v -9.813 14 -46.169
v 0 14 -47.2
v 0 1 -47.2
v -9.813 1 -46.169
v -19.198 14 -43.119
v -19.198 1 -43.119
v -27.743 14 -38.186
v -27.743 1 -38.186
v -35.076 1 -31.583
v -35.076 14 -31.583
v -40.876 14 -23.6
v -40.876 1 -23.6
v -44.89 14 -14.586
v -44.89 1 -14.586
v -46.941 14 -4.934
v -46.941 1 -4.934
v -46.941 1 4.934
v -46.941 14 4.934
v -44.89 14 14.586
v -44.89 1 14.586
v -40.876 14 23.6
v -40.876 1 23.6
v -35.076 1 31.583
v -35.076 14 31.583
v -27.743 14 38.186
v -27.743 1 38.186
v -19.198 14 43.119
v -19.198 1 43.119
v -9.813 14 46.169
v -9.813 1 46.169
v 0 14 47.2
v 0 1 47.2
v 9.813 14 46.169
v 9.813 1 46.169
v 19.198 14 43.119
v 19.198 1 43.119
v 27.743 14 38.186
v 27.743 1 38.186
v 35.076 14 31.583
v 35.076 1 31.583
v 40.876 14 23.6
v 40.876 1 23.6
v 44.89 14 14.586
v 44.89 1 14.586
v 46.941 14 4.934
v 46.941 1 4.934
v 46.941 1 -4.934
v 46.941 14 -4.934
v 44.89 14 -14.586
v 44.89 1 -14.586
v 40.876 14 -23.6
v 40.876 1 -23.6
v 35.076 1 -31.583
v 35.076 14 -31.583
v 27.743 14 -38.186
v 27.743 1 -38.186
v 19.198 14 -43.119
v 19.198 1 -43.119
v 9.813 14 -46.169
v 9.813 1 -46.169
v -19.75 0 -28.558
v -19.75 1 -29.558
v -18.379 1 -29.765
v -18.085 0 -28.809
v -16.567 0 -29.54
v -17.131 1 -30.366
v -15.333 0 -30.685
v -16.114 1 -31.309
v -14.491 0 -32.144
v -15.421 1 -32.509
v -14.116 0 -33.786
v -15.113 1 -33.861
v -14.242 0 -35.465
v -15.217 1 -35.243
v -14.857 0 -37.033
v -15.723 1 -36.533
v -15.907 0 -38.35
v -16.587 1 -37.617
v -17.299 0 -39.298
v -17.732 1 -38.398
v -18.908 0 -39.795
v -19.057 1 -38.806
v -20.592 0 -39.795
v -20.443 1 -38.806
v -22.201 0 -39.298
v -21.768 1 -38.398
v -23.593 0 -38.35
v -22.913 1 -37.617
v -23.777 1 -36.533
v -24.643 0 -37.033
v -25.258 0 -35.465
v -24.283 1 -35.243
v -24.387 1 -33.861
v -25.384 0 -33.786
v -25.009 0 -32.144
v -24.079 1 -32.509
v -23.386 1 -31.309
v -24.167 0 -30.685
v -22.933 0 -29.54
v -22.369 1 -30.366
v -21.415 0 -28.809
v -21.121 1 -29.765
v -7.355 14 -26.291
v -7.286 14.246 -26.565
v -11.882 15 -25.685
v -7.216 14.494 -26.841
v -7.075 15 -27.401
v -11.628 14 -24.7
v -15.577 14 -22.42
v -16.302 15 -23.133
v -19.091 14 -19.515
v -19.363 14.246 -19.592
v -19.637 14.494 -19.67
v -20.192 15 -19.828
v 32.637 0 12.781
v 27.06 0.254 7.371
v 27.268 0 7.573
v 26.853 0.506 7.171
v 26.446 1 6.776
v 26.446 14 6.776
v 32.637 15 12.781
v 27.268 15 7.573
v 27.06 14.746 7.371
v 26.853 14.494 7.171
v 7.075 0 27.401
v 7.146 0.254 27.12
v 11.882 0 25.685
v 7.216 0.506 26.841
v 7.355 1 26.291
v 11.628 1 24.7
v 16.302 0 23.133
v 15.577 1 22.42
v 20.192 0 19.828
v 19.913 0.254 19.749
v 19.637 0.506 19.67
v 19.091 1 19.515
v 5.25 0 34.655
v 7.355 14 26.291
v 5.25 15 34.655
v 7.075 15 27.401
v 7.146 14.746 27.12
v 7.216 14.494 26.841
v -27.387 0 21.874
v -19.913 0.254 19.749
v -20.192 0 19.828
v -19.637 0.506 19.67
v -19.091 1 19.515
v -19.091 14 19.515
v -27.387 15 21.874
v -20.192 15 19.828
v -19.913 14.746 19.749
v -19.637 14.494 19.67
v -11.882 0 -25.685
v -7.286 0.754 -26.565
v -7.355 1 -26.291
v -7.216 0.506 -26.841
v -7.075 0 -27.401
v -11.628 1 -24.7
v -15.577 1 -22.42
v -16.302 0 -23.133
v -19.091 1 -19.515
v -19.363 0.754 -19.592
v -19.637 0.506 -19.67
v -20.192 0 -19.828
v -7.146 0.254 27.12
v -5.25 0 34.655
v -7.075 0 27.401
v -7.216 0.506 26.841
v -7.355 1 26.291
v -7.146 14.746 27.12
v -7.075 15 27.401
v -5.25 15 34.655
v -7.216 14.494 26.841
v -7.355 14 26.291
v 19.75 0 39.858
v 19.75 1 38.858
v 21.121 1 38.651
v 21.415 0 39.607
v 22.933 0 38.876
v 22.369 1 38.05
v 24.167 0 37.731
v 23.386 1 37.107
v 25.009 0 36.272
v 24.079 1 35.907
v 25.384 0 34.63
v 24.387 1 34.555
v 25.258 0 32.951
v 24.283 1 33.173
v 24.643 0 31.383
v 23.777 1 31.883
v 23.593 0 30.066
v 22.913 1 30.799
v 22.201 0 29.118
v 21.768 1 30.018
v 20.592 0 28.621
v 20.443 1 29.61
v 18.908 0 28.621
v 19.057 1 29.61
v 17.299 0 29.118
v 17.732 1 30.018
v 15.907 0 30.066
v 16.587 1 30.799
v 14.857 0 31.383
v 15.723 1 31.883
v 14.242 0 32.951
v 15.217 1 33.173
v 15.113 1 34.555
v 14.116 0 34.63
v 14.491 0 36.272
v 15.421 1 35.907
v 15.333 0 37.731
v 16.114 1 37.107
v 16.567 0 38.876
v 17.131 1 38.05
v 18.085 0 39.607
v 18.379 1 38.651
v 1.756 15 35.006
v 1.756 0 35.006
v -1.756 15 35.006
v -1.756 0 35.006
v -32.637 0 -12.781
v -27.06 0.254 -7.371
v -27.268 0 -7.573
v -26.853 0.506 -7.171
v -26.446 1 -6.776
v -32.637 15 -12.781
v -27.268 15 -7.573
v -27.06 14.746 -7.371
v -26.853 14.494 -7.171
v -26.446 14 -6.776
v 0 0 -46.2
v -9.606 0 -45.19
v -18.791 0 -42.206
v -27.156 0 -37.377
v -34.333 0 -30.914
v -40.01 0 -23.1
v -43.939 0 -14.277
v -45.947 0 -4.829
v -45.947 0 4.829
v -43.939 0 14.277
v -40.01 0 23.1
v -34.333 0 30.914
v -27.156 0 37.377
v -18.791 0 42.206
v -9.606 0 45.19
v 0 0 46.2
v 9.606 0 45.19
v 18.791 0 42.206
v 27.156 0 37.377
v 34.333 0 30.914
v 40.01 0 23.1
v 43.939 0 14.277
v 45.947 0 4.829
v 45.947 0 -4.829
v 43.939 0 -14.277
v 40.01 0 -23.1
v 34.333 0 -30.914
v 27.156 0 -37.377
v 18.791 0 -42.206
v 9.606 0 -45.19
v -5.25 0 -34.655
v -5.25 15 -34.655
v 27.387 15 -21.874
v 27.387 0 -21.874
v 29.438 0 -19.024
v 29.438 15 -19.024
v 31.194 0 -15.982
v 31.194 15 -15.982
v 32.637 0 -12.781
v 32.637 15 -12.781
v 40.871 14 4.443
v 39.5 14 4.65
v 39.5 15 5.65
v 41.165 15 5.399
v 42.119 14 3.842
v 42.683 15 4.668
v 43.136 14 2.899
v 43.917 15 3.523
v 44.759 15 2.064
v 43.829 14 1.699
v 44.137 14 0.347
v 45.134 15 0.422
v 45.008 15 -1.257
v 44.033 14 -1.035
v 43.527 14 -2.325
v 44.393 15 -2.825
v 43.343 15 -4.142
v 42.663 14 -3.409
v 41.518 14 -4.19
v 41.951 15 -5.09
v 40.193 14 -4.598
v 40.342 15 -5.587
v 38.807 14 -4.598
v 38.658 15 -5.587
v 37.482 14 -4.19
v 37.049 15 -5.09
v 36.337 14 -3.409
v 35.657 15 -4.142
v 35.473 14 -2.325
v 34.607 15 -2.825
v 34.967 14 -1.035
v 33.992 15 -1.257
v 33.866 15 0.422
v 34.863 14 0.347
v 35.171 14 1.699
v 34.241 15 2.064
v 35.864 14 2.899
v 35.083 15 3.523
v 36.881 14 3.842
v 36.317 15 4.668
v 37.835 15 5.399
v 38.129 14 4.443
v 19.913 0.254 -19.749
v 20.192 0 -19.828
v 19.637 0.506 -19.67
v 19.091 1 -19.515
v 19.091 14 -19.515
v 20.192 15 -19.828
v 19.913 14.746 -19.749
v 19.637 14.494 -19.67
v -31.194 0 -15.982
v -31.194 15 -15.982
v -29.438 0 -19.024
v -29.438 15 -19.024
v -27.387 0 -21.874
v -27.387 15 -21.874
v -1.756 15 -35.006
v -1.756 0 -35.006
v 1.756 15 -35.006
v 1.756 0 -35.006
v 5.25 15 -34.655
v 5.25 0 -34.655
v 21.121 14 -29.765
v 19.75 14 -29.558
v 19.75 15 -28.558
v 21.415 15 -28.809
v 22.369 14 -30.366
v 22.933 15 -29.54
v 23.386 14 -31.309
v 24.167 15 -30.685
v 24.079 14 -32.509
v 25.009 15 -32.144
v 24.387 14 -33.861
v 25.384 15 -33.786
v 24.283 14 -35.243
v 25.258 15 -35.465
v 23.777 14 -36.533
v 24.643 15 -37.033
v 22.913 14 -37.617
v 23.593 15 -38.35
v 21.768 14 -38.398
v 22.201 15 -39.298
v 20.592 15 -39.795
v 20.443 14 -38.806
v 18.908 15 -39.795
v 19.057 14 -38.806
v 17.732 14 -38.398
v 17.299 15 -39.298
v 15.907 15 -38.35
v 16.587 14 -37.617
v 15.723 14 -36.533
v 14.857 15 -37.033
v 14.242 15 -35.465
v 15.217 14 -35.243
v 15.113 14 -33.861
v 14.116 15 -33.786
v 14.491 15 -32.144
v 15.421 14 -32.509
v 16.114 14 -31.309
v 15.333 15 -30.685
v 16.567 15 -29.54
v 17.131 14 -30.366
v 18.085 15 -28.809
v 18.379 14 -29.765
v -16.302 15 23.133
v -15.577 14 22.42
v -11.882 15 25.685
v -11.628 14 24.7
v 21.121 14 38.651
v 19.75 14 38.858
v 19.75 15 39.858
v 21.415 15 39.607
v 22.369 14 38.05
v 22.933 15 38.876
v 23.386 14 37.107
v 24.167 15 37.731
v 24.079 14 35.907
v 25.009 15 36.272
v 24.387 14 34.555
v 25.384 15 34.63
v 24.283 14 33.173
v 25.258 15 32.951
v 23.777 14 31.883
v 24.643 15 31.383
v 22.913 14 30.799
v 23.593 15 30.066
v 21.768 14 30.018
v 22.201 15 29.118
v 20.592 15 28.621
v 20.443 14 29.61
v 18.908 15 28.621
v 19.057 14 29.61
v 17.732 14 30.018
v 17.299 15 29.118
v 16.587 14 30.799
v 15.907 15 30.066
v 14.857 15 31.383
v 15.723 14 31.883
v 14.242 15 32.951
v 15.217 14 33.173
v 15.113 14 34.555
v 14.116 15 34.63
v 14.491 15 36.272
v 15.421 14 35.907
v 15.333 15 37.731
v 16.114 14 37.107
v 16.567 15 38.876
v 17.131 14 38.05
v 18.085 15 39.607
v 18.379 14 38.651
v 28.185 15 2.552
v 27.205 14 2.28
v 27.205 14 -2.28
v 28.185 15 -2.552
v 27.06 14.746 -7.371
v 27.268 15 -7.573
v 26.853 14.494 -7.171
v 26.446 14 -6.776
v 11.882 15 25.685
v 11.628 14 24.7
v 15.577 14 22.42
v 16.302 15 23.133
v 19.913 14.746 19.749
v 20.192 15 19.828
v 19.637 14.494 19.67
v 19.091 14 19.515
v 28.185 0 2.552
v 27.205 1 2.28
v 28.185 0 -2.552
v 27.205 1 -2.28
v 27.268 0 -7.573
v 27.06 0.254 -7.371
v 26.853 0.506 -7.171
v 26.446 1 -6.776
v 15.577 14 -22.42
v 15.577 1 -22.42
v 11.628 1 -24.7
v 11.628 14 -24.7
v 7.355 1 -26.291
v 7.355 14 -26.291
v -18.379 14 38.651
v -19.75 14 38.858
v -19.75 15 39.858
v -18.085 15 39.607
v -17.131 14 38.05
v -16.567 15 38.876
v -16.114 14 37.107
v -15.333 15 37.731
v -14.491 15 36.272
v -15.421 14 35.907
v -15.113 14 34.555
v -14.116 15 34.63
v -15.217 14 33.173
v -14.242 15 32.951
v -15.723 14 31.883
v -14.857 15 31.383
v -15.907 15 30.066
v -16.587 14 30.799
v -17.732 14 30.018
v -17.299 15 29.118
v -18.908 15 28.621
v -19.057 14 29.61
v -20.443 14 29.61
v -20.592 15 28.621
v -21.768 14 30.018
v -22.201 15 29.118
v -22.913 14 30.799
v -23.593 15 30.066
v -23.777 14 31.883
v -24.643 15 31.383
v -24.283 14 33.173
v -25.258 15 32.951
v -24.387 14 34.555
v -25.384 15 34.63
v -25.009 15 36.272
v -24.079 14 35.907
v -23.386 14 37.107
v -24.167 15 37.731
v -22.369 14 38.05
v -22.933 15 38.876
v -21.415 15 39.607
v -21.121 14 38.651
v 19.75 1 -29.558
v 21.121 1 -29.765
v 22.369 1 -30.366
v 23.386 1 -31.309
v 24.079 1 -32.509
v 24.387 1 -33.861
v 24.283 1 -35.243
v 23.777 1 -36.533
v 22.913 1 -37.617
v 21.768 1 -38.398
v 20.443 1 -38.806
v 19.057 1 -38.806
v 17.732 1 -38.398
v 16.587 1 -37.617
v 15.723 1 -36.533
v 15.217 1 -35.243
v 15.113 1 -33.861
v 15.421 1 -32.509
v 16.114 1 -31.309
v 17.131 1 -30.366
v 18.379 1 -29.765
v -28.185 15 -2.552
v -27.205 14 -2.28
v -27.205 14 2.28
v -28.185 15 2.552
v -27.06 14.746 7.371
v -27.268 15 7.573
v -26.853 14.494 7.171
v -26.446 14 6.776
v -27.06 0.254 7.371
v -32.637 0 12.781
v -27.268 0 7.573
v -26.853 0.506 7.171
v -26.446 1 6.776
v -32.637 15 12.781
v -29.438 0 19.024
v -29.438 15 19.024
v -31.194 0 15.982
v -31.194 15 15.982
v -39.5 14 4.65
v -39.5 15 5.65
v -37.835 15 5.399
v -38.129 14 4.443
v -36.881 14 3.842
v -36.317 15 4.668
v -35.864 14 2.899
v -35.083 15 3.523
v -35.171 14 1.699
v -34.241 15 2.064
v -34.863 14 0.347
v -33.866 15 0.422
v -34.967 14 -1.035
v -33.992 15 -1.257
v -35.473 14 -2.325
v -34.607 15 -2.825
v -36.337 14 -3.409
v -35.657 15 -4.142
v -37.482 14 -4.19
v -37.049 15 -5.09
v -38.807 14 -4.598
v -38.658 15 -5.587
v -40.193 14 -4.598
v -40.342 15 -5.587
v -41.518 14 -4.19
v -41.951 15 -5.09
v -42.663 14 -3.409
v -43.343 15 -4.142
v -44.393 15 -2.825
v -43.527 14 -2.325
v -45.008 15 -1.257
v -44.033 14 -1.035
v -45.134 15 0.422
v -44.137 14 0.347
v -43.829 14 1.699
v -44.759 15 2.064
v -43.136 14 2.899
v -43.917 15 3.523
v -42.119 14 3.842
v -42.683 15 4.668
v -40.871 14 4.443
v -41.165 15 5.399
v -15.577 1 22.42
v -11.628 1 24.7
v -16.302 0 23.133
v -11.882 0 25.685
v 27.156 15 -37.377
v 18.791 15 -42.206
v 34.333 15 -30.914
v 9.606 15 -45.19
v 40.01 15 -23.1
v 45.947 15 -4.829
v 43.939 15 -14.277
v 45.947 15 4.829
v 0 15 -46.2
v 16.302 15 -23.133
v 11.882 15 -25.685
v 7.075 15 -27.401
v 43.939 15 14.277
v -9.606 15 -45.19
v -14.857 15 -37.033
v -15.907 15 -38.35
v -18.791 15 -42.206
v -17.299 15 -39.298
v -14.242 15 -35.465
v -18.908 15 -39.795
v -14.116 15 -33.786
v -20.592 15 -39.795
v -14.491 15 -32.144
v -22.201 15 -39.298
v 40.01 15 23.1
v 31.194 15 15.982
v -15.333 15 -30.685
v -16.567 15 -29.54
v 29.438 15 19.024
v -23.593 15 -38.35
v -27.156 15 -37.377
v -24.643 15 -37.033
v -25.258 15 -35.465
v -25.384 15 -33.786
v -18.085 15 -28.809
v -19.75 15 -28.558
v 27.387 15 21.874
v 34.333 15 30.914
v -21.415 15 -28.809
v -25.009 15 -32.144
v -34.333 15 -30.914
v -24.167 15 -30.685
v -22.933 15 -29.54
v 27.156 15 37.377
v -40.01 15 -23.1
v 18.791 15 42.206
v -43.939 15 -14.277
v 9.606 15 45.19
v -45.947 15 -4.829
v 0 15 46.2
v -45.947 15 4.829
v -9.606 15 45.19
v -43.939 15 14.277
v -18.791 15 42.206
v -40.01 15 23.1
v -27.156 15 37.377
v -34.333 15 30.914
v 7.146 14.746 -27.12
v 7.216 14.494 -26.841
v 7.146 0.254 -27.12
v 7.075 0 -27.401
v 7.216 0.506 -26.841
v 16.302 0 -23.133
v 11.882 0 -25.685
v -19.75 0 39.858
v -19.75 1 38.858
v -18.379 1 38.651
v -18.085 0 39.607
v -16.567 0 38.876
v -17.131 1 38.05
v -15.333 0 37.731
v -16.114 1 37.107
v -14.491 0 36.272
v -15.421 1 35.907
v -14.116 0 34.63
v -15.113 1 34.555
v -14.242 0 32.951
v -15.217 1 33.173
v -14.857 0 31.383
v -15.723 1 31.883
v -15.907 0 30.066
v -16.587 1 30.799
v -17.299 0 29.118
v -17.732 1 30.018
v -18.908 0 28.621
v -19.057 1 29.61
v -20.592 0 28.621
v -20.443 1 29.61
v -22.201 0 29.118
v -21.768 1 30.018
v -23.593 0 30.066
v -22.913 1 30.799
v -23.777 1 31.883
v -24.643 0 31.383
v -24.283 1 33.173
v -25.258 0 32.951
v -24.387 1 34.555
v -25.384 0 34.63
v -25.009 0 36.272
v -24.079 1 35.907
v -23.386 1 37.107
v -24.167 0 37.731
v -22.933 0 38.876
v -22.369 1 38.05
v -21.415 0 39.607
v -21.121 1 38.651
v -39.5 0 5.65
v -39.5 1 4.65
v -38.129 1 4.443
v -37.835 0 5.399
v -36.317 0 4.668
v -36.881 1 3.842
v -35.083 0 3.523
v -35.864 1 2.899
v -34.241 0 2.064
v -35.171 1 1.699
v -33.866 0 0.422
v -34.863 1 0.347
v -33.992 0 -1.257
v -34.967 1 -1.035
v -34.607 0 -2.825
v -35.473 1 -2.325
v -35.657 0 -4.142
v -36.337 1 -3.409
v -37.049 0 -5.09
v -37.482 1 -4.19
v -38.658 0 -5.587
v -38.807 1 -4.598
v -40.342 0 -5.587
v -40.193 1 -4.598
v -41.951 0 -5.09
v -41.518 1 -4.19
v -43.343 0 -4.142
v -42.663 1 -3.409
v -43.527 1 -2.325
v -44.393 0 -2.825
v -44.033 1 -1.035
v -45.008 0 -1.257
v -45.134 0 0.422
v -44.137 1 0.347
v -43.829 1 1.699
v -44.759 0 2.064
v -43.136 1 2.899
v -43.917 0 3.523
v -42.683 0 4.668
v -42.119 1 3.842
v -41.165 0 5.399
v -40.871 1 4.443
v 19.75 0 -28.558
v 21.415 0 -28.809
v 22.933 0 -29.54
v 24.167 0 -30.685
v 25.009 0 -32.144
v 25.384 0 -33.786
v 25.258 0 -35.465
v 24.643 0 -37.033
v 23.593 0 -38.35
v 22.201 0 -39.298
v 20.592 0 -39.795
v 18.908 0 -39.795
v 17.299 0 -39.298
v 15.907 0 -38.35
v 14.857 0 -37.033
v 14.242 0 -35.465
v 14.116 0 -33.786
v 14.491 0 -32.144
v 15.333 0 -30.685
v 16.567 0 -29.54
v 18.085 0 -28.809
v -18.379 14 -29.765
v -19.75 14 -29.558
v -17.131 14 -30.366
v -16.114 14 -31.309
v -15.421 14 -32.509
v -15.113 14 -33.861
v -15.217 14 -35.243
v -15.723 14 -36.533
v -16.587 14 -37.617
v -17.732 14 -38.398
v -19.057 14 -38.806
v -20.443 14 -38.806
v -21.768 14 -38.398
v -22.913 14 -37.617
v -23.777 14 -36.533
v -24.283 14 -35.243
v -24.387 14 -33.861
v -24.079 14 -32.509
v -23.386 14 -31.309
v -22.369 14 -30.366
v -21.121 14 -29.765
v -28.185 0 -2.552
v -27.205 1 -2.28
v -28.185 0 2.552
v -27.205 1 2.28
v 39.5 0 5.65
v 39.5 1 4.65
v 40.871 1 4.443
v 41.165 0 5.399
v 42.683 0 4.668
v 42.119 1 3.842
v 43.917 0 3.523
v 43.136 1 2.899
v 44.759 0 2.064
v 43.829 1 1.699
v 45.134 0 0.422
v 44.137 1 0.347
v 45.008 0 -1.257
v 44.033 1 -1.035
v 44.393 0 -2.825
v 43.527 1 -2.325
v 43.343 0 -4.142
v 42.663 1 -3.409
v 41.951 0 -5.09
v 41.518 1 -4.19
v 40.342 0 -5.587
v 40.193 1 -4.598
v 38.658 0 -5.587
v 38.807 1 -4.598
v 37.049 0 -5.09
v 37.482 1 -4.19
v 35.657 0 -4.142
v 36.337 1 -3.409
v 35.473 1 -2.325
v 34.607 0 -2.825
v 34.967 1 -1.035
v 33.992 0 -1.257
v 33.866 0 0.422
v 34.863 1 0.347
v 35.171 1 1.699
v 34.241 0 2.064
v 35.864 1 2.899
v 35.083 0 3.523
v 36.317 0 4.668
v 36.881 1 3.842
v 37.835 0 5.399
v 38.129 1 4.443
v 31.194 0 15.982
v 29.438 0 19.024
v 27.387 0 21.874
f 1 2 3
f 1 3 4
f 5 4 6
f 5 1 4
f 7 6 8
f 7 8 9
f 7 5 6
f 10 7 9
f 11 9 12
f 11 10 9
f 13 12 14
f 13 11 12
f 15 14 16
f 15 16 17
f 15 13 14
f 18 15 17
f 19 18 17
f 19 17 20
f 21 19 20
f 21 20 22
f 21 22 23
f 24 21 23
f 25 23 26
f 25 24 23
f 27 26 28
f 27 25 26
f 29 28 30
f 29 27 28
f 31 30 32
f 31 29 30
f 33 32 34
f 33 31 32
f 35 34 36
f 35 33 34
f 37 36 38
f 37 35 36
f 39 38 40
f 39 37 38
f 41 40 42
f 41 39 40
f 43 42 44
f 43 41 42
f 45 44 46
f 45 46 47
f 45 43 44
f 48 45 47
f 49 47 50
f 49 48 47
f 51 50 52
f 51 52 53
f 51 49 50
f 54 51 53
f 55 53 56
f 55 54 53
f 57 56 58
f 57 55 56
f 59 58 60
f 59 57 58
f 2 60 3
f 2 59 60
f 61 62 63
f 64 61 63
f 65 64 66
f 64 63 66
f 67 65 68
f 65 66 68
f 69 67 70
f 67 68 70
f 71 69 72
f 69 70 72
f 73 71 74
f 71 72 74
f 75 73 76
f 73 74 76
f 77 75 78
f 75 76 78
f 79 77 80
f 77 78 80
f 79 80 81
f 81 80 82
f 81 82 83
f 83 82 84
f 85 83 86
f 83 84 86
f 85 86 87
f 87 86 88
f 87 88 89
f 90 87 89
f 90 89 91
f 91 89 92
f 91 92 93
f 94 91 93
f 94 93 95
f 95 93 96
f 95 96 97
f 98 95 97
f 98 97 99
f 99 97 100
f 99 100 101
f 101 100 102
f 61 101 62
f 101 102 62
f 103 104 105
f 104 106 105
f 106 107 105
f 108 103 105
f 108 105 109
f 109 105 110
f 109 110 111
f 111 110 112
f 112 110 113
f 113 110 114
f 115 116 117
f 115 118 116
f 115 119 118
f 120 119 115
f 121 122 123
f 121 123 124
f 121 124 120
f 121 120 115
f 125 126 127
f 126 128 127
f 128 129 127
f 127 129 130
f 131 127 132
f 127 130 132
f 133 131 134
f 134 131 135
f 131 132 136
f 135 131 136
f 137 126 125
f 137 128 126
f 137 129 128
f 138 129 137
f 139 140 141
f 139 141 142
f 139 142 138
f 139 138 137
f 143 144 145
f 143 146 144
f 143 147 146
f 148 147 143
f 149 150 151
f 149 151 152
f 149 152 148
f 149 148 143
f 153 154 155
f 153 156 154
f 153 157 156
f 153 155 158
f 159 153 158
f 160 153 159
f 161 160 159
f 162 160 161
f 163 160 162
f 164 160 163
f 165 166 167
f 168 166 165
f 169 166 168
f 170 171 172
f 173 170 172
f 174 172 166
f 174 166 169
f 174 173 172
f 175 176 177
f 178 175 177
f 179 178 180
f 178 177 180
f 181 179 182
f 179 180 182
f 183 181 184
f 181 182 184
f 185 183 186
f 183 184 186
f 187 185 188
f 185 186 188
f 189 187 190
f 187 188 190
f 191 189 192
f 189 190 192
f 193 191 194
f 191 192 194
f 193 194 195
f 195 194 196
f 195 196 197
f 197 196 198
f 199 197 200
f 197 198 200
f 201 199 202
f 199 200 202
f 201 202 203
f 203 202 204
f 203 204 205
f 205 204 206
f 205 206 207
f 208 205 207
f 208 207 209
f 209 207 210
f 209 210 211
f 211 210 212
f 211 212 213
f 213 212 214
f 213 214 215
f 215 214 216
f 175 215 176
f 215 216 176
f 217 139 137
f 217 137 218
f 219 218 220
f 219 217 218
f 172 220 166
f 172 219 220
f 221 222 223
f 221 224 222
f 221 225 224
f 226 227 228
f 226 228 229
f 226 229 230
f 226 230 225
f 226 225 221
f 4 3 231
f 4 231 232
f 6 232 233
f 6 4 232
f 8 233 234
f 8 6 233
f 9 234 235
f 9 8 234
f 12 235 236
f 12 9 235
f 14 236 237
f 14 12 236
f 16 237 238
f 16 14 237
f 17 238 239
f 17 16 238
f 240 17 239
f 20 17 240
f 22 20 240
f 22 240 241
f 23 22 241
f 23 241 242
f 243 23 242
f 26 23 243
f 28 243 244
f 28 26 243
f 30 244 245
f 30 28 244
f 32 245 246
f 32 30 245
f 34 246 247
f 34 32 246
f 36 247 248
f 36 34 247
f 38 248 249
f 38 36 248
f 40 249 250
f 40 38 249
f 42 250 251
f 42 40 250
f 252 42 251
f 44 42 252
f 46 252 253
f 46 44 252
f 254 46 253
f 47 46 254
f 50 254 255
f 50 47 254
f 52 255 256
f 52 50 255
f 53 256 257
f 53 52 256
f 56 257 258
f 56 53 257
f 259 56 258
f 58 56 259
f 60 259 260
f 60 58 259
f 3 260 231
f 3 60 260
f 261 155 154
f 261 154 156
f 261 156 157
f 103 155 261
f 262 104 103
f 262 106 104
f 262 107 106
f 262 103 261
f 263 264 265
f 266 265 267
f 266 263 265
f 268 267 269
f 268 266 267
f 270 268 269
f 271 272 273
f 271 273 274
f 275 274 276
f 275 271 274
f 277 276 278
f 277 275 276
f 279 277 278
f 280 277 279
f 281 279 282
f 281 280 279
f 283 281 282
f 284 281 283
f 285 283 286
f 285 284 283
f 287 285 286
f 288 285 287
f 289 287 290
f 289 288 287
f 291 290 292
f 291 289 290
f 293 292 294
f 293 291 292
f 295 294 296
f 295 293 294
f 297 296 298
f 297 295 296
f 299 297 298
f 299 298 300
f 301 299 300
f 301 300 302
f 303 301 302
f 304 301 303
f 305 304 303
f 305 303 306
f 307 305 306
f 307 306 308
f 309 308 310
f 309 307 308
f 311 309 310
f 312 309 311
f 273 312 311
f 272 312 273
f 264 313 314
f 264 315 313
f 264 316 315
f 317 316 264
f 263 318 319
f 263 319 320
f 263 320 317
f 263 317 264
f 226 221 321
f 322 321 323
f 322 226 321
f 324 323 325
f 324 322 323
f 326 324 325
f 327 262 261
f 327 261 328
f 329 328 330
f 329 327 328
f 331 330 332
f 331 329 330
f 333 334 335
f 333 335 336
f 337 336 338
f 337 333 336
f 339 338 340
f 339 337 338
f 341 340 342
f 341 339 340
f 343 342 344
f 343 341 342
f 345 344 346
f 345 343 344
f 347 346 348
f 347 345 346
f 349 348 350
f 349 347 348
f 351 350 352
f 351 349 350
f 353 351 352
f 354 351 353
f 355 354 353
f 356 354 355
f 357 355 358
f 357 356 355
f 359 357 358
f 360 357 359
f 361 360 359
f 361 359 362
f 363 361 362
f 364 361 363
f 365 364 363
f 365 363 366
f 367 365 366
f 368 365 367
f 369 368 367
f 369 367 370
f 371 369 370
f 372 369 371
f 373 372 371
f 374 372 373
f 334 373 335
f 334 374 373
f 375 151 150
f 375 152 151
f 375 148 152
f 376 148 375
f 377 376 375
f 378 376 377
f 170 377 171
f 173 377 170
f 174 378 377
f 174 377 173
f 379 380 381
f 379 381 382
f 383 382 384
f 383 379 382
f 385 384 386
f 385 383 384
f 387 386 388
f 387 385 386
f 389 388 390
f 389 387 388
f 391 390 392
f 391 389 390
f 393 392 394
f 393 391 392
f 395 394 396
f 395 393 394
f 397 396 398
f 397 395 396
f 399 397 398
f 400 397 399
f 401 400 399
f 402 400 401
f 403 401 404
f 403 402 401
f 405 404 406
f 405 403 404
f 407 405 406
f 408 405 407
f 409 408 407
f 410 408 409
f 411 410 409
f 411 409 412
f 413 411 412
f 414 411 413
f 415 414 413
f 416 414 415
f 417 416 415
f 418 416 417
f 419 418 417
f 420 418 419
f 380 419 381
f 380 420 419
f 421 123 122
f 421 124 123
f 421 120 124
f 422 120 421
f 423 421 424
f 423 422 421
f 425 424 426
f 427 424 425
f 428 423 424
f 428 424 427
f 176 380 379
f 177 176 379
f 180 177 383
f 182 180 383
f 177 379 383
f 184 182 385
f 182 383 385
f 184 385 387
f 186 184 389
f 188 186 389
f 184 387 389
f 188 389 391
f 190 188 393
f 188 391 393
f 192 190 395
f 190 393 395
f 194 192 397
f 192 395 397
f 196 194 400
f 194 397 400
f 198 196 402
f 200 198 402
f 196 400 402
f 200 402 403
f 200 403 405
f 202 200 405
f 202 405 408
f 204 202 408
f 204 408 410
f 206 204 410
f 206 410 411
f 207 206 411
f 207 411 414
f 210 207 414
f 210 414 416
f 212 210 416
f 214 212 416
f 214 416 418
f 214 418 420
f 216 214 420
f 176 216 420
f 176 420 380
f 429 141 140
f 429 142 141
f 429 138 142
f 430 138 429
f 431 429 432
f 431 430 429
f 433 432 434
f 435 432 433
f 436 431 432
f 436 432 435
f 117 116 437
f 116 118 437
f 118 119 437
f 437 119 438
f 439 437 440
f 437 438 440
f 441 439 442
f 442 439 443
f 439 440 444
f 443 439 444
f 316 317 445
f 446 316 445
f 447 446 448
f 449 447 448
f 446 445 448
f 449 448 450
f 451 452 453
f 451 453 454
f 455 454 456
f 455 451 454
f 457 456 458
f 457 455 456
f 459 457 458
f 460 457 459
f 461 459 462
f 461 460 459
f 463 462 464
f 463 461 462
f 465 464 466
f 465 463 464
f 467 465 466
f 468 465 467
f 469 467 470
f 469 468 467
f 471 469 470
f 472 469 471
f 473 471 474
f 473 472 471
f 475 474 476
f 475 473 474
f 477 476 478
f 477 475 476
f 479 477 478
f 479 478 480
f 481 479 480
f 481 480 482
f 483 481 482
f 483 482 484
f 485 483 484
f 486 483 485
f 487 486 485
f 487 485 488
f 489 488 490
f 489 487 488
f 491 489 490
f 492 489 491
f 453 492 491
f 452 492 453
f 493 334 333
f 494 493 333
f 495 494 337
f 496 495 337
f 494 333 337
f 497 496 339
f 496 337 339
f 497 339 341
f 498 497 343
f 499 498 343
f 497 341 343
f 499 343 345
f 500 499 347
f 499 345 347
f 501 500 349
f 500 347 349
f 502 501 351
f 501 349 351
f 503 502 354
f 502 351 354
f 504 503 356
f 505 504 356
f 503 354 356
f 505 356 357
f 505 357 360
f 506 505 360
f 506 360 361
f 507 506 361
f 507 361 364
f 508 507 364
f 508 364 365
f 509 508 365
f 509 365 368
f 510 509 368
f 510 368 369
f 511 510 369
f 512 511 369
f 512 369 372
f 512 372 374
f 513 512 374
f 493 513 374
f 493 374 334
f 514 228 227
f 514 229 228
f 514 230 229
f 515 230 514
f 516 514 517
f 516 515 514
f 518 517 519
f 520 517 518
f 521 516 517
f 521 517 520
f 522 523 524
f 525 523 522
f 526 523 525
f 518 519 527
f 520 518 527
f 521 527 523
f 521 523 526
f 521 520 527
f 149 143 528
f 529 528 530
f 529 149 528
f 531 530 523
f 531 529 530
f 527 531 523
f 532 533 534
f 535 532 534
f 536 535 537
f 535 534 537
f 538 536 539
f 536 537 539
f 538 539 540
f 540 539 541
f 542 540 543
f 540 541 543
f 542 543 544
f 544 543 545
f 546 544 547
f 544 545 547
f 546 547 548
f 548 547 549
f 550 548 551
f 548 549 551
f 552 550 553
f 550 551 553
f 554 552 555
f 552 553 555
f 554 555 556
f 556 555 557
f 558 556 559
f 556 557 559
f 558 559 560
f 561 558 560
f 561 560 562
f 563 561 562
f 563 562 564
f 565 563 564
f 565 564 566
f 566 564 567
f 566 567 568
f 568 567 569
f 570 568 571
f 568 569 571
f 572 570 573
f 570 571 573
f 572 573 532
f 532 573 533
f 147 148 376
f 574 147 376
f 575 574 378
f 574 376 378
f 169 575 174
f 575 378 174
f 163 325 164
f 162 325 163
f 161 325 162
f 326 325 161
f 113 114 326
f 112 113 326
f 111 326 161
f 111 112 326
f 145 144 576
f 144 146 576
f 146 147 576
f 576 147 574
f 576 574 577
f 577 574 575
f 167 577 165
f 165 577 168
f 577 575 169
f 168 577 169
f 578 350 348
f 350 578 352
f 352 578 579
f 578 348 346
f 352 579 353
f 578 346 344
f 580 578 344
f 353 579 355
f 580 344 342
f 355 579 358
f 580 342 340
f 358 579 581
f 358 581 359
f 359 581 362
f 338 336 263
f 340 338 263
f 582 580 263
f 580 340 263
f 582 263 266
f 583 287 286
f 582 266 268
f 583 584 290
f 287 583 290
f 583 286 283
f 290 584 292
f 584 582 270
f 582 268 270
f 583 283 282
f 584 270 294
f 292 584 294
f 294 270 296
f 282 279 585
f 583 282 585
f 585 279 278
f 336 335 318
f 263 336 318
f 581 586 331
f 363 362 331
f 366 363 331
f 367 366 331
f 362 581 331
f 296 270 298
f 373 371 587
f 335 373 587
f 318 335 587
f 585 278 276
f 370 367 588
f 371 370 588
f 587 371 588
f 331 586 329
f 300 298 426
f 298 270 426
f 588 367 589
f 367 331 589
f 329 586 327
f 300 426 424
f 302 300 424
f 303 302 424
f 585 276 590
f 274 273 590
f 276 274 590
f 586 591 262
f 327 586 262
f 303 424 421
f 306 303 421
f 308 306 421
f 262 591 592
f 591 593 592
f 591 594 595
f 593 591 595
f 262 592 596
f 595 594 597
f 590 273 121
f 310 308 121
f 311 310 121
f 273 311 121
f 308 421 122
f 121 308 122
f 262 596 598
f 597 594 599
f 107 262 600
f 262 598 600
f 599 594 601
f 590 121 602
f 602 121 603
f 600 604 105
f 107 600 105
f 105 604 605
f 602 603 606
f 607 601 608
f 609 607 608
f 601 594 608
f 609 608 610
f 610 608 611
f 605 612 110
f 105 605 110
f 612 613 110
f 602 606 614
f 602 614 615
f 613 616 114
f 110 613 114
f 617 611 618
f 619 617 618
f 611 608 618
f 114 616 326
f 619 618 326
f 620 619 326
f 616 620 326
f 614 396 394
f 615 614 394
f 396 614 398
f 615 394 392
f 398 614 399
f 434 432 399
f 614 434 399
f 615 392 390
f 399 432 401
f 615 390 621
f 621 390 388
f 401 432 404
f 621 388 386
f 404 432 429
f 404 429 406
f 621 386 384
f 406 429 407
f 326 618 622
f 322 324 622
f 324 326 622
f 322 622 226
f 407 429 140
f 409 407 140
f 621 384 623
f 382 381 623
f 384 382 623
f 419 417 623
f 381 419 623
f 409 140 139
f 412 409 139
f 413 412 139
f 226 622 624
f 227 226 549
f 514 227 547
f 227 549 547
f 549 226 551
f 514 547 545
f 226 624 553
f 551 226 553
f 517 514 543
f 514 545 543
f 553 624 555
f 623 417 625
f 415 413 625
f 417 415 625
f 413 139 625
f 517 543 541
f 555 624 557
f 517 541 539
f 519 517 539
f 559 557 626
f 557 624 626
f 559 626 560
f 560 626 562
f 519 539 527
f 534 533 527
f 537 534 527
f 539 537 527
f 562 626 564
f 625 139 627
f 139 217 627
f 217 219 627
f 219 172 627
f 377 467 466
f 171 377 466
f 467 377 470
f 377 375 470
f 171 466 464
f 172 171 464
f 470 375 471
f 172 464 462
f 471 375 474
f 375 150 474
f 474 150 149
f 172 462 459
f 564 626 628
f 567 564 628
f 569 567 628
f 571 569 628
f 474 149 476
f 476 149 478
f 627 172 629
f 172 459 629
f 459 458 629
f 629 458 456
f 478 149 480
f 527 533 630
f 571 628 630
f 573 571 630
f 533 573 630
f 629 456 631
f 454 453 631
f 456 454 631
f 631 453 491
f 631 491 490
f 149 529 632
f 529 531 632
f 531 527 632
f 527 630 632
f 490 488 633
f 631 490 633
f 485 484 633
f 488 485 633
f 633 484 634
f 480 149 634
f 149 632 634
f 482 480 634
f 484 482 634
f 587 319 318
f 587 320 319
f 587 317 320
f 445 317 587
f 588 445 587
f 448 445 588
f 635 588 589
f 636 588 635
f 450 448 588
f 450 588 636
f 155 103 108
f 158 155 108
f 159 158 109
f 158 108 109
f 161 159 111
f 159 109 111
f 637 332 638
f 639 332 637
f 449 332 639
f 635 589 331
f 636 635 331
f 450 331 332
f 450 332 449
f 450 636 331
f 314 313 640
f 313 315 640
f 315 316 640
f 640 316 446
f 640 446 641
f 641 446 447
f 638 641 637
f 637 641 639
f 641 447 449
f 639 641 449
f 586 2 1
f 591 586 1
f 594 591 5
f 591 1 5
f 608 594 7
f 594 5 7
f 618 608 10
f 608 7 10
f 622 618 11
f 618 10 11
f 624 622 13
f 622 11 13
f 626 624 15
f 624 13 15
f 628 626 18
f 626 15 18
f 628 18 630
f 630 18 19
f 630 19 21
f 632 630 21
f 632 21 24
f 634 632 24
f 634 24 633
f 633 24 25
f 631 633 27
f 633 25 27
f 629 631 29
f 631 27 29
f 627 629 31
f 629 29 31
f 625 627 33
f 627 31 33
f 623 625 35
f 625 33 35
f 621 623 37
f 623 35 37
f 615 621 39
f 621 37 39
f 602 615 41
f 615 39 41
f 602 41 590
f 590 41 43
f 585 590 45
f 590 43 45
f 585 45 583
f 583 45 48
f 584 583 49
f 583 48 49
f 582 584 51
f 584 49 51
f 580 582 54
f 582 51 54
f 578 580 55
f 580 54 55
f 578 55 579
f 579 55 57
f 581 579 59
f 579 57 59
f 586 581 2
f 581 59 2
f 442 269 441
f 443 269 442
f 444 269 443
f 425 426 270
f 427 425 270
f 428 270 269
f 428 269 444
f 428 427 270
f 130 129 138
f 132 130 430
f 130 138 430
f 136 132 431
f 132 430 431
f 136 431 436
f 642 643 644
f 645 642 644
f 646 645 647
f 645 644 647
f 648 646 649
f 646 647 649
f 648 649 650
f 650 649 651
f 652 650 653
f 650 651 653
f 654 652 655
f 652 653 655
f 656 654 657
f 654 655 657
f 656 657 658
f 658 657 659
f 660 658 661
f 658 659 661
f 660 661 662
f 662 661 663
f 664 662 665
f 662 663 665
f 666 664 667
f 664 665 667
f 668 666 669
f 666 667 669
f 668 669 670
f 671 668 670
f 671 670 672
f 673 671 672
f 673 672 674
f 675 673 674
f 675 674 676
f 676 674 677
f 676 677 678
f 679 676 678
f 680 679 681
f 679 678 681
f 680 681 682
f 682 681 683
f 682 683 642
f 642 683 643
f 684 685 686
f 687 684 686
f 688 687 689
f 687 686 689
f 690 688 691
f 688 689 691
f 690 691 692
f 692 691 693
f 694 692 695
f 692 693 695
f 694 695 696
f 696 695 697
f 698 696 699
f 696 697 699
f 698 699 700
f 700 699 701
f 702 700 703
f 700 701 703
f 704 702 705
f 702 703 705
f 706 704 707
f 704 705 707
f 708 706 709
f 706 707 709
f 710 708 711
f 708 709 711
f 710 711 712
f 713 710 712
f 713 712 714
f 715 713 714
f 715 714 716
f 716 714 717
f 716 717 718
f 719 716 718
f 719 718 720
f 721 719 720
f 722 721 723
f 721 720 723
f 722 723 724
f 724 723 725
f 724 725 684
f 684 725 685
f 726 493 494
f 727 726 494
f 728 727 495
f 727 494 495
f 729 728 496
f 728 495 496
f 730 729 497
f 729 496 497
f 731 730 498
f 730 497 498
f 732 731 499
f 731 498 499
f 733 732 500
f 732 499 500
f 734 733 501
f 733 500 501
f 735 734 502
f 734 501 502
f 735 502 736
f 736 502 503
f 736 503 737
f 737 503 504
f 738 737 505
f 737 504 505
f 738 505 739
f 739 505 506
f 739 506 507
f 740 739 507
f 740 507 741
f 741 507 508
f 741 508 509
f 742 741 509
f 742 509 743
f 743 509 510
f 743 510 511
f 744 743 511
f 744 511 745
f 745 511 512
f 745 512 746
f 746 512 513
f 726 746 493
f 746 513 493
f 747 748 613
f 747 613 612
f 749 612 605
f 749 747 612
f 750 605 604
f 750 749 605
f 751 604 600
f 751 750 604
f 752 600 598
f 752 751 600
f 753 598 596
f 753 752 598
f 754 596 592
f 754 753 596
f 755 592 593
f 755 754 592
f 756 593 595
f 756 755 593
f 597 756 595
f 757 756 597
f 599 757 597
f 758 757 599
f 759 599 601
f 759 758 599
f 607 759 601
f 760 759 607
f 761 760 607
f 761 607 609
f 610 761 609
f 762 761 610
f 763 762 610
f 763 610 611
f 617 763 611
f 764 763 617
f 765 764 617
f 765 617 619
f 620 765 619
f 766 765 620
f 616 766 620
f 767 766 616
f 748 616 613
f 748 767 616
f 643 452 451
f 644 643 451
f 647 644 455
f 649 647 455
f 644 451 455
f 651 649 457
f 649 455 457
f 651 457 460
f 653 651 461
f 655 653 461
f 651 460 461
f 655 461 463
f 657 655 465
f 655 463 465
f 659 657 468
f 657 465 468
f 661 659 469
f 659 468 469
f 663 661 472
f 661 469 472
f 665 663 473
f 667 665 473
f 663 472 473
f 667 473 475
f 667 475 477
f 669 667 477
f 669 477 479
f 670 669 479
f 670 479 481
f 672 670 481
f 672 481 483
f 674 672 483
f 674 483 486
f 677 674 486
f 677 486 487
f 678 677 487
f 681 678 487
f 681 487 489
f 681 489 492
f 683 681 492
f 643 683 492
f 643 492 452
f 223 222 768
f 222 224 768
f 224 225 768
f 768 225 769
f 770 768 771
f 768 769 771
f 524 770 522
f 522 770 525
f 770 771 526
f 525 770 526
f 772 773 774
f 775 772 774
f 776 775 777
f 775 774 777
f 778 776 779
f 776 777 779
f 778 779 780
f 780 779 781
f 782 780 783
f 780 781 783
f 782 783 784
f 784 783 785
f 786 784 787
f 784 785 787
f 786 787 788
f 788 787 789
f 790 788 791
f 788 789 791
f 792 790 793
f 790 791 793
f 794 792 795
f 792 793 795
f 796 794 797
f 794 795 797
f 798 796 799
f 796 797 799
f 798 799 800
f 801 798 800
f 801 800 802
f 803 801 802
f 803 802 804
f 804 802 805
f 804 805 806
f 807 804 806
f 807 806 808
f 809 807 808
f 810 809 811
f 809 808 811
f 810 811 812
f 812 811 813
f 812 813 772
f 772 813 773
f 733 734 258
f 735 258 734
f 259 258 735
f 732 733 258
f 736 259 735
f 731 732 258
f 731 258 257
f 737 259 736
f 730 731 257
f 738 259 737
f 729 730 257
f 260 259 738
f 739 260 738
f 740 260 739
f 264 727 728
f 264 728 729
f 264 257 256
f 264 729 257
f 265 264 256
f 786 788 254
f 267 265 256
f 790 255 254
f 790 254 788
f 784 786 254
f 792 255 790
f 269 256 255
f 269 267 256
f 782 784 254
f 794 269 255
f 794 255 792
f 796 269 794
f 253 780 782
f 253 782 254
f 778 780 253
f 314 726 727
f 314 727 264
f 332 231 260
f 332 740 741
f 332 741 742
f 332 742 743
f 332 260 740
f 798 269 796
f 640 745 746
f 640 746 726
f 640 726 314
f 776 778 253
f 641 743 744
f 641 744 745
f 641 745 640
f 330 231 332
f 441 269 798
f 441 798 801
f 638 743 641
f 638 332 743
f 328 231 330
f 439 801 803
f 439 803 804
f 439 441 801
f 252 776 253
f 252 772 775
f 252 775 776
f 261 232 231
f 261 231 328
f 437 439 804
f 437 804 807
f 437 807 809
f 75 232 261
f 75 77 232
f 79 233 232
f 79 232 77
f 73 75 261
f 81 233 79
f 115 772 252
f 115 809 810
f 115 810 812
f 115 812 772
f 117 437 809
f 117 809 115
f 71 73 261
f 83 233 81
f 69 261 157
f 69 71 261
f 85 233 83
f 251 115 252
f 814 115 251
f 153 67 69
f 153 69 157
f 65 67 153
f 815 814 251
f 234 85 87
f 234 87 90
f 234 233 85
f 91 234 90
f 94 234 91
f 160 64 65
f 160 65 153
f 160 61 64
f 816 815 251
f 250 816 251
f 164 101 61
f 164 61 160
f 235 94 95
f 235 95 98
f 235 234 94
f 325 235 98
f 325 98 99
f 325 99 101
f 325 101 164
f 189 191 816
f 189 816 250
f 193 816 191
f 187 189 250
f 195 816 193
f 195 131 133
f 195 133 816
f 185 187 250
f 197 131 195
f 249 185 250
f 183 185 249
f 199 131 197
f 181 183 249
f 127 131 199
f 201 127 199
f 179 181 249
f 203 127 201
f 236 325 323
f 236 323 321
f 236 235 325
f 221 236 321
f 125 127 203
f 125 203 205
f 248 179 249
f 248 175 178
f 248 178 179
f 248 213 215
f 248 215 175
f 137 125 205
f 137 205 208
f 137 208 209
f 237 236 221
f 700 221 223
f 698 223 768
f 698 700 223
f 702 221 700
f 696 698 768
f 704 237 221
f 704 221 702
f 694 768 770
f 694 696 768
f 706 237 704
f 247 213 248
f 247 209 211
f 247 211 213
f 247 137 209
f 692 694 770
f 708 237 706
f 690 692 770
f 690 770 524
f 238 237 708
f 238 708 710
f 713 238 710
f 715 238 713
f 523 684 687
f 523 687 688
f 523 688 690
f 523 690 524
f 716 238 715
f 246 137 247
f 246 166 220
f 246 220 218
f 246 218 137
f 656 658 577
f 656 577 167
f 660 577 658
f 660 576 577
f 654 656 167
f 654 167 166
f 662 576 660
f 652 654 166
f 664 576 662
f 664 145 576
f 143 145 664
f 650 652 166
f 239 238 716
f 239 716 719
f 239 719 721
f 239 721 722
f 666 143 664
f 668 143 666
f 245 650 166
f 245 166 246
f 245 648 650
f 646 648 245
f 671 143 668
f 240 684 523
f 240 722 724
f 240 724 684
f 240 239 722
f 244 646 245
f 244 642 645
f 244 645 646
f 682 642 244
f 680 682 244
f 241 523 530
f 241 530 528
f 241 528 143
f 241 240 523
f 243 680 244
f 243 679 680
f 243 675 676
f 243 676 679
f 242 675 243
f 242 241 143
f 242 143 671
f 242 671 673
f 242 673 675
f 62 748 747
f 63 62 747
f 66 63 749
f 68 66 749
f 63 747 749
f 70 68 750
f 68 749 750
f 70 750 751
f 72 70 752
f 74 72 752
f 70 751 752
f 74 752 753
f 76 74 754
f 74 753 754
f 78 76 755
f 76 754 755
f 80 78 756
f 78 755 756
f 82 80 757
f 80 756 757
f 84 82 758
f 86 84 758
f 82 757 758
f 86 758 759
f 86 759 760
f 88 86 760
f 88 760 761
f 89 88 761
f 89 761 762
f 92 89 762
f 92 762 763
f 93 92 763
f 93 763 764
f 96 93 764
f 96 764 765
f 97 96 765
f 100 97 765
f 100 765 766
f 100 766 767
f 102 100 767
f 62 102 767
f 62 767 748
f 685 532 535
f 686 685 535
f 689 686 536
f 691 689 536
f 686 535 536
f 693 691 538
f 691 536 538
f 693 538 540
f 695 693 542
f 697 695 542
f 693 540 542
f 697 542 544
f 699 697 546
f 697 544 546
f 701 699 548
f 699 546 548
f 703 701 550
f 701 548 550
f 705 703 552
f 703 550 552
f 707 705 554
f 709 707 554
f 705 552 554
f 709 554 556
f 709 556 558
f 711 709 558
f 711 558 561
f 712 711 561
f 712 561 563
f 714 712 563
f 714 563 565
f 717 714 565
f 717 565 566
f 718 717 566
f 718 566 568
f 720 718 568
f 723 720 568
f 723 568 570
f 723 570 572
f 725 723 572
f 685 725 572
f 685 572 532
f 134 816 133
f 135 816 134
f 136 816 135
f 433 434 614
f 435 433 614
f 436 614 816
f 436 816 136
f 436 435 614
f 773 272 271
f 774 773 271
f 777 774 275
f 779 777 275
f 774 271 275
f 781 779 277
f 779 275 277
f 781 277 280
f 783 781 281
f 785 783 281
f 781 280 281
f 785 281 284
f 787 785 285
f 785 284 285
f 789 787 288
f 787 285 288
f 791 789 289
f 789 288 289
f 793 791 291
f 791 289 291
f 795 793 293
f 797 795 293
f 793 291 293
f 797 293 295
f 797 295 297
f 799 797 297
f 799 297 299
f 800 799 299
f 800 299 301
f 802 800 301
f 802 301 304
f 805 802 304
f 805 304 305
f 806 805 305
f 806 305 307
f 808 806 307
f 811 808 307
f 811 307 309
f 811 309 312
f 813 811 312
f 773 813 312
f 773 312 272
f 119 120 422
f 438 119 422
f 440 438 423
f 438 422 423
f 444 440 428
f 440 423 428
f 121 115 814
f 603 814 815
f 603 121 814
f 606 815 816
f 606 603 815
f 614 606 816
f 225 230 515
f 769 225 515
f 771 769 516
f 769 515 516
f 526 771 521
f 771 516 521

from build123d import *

# Parameters (mm, degrees)
ESBO_O1_W             = 19.9
ESBO_O1_H             = 15
ESBO_O2_R             = 4.65
CORTE_EXTRUS_O1_DEPTH = 69.415495321
CORTE_EXTRUS_O2_DEPTH = 69.415495321
CHANFRO1_SIZE         = 1
CHANFRO2_SIZE         = 1
CHANFRO3_SIZE         = 1
CHANFRO4_SIZE         = 1


with BuildPart() as part:
    # Esboço1 → Revolução1 (revolve)
    with BuildSketch(Plane.XY, mode=Mode.PRIVATE) as revolu_o1_sk:
        with Locations((37.25, 7.5)):
            Rectangle(ESBO_O1_W, ESBO_O1_H)
    revolve(revolu_o1_sk.sketch.rotate(Axis((0, -49.922822823, 0), (0, 1, 0)), 90), axis=Axis((0, -49.922822823, 0), (0, 1, 0)))

    # Esboço2 → Corte-extrusão1 (cut, through all)
    with BuildSketch(Plane(origin=(0, 15, 0), x_dir=(1, 0, 0), z_dir=(0, 1, 0))):
        with Locations(Location((-39.5, 0, 0), (0, 0, 270))):
            Circle(ESBO_O2_R)
        with Locations(Location((-19.75, 34.208003449, 0), (0, 0, 270))):
            Circle(ESBO_O2_R)
        with Locations(Location((19.75, 34.208003449, 0), (0, 0, 270))):
            Circle(ESBO_O2_R)
        with Locations(Location((39.5, 0, 0), (0, 0, 270))):
            Circle(ESBO_O2_R)
        with Locations(Location((19.75, -34.208003449, 0), (0, 0, 270))):
            Circle(ESBO_O2_R)
        with Locations(Location((-19.75, -34.208003449, 0), (0, 0, 270))):
            Circle(ESBO_O2_R)
    extrude(amount=-CORTE_EXTRUS_O1_DEPTH, mode=Mode.SUBTRACT)

    # Esboço3 → Corte-extrusão2 (cut, through all)
    with BuildSketch(Plane(origin=(0, 15, 0), x_dir=(1, 0, 0), z_dir=(0, 1, 0))):
        with BuildLine():
            Line((5.25, 34.654581227), (7.355, 26.290568176))
            ThreePointArc((7.355, 26.290568176), (0, 27.3), (-7.355, 26.290568176))
            Line((-7.355, 26.290568176), (-5.25, 34.654581227))
            ThreePointArc((-5.25, 34.654581227), (0, 35.05), (5.25, 34.654581227))
        make_face()
        with BuildLine():
            Line((32.6367477, 12.780657243), (26.44579992, 6.775667243))
            ThreePointArc((26.44579992, 6.775667243), (23.642493523, 13.65), (19.09079992, 19.514900933))
            Line((19.09079992, 19.514900933), (27.3867477, 21.873923983))
            ThreePointArc((27.3867477, 21.873923983), (30.354190403, 17.525), (32.6367477, 12.780657243))
        make_face()
        with BuildLine():
            Line((27.3867477, -21.873923983), (19.09079992, -19.514900933))
            ThreePointArc((19.09079992, -19.514900933), (23.642493523, -13.65), (26.44579992, -6.775667243))
            Line((26.44579992, -6.775667243), (32.6367477, -12.780657243))
            ThreePointArc((32.6367477, -12.780657243), (30.354190403, -17.525), (27.3867477, -21.873923983))
        make_face()
        with BuildLine():
            Line((-5.25, -34.654581227), (-7.355, -26.290568176))
            ThreePointArc((-7.355, -26.290568176), (0, -27.3), (7.355, -26.290568176))
            Line((7.355, -26.290568176), (5.25, -34.654581227))
            ThreePointArc((5.25, -34.654581227), (0, -35.05), (-5.25, -34.654581227))
        make_face()
        with BuildLine():
            Line((-32.6367477, -12.780657243), (-26.44579992, -6.775667243))
            ThreePointArc((-26.44579992, -6.775667243), (-23.642493523, -13.65), (-19.09079992, -19.514900933))
            Line((-19.09079992, -19.514900933), (-27.3867477, -21.873923983))
            ThreePointArc((-27.3867477, -21.873923983), (-30.354190403, -17.525), (-32.6367477, -12.780657243))
        make_face()
        with BuildLine():
            Line((-27.3867477, 21.873923983), (-19.09079992, 19.514900933))
            ThreePointArc((-19.09079992, 19.514900933), (-23.642493523, 13.65), (-26.44579992, 6.775667243))
            Line((-26.44579992, 6.775667243), (-32.6367477, 12.780657243))
            ThreePointArc((-32.6367477, 12.780657243), (-30.354190403, 17.525), (-27.3867477, 21.873923983))
        make_face()
    extrude(amount=-CORTE_EXTRUS_O2_DEPTH, mode=Mode.SUBTRACT)

    # Chanfro1
    chanfro1_edges = [part.edges().sort_by_distance(p)[0] for p in [
        (-13.65, 0, -23.642493523),
        (-13.65, 15, -23.642493523),
        (0, 0, 47.2),
        (0, 15, 47.2),
        (13.65, 15, -23.642493523),
        (27.3, 15, 0),
        (13.65, 15, 23.642493523),
        (-13.65, 15, 23.642493523),
        (-27.3, 0, 0),
        (-27.3, 15, 0),
    ]]
    chamfer(chanfro1_edges, length=CHANFRO1_SIZE)

    # Chanfro2
    chanfro2_edges = [part.edges().sort_by_distance(p)[0] for p in [
        (13.65, 0, -23.642493523),
        (27.3, 0, 0),
        (13.65, 0, 23.642493523),
        (-13.65, 0, 23.642493523),
    ]]
    chamfer(chanfro2_edges, length=CHANFRO2_SIZE)

    # Chanfro3
    chanfro3_edges = [part.edges().sort_by_distance(p)[0] for p in [
        (-39.5, 0, -4.65),
        (-19.75, 0, -38.858003449),
        (19.75, 0, -38.858003449),
        (39.5, 0, -4.65),
        (19.75, 0, 29.558003449),
        (-19.75, 0, 29.558003449),
    ]]
    chamfer(chanfro3_edges, length=CHANFRO3_SIZE)

    # Chanfro4
    chanfro4_edges = [part.edges().sort_by_distance(p)[0] for p in [
        (-39.5, 15, -4.65),
        (-19.75, 15, -38.858003449),
        (19.75, 15, -38.858003449),
        (39.5, 15, -4.65),
        (19.75, 15, 29.558003449),
        (-19.75, 15, 29.558003449),
    ]]
    chamfer(chanfro4_edges, length=CHANFRO4_SIZE)


solid = part.part
